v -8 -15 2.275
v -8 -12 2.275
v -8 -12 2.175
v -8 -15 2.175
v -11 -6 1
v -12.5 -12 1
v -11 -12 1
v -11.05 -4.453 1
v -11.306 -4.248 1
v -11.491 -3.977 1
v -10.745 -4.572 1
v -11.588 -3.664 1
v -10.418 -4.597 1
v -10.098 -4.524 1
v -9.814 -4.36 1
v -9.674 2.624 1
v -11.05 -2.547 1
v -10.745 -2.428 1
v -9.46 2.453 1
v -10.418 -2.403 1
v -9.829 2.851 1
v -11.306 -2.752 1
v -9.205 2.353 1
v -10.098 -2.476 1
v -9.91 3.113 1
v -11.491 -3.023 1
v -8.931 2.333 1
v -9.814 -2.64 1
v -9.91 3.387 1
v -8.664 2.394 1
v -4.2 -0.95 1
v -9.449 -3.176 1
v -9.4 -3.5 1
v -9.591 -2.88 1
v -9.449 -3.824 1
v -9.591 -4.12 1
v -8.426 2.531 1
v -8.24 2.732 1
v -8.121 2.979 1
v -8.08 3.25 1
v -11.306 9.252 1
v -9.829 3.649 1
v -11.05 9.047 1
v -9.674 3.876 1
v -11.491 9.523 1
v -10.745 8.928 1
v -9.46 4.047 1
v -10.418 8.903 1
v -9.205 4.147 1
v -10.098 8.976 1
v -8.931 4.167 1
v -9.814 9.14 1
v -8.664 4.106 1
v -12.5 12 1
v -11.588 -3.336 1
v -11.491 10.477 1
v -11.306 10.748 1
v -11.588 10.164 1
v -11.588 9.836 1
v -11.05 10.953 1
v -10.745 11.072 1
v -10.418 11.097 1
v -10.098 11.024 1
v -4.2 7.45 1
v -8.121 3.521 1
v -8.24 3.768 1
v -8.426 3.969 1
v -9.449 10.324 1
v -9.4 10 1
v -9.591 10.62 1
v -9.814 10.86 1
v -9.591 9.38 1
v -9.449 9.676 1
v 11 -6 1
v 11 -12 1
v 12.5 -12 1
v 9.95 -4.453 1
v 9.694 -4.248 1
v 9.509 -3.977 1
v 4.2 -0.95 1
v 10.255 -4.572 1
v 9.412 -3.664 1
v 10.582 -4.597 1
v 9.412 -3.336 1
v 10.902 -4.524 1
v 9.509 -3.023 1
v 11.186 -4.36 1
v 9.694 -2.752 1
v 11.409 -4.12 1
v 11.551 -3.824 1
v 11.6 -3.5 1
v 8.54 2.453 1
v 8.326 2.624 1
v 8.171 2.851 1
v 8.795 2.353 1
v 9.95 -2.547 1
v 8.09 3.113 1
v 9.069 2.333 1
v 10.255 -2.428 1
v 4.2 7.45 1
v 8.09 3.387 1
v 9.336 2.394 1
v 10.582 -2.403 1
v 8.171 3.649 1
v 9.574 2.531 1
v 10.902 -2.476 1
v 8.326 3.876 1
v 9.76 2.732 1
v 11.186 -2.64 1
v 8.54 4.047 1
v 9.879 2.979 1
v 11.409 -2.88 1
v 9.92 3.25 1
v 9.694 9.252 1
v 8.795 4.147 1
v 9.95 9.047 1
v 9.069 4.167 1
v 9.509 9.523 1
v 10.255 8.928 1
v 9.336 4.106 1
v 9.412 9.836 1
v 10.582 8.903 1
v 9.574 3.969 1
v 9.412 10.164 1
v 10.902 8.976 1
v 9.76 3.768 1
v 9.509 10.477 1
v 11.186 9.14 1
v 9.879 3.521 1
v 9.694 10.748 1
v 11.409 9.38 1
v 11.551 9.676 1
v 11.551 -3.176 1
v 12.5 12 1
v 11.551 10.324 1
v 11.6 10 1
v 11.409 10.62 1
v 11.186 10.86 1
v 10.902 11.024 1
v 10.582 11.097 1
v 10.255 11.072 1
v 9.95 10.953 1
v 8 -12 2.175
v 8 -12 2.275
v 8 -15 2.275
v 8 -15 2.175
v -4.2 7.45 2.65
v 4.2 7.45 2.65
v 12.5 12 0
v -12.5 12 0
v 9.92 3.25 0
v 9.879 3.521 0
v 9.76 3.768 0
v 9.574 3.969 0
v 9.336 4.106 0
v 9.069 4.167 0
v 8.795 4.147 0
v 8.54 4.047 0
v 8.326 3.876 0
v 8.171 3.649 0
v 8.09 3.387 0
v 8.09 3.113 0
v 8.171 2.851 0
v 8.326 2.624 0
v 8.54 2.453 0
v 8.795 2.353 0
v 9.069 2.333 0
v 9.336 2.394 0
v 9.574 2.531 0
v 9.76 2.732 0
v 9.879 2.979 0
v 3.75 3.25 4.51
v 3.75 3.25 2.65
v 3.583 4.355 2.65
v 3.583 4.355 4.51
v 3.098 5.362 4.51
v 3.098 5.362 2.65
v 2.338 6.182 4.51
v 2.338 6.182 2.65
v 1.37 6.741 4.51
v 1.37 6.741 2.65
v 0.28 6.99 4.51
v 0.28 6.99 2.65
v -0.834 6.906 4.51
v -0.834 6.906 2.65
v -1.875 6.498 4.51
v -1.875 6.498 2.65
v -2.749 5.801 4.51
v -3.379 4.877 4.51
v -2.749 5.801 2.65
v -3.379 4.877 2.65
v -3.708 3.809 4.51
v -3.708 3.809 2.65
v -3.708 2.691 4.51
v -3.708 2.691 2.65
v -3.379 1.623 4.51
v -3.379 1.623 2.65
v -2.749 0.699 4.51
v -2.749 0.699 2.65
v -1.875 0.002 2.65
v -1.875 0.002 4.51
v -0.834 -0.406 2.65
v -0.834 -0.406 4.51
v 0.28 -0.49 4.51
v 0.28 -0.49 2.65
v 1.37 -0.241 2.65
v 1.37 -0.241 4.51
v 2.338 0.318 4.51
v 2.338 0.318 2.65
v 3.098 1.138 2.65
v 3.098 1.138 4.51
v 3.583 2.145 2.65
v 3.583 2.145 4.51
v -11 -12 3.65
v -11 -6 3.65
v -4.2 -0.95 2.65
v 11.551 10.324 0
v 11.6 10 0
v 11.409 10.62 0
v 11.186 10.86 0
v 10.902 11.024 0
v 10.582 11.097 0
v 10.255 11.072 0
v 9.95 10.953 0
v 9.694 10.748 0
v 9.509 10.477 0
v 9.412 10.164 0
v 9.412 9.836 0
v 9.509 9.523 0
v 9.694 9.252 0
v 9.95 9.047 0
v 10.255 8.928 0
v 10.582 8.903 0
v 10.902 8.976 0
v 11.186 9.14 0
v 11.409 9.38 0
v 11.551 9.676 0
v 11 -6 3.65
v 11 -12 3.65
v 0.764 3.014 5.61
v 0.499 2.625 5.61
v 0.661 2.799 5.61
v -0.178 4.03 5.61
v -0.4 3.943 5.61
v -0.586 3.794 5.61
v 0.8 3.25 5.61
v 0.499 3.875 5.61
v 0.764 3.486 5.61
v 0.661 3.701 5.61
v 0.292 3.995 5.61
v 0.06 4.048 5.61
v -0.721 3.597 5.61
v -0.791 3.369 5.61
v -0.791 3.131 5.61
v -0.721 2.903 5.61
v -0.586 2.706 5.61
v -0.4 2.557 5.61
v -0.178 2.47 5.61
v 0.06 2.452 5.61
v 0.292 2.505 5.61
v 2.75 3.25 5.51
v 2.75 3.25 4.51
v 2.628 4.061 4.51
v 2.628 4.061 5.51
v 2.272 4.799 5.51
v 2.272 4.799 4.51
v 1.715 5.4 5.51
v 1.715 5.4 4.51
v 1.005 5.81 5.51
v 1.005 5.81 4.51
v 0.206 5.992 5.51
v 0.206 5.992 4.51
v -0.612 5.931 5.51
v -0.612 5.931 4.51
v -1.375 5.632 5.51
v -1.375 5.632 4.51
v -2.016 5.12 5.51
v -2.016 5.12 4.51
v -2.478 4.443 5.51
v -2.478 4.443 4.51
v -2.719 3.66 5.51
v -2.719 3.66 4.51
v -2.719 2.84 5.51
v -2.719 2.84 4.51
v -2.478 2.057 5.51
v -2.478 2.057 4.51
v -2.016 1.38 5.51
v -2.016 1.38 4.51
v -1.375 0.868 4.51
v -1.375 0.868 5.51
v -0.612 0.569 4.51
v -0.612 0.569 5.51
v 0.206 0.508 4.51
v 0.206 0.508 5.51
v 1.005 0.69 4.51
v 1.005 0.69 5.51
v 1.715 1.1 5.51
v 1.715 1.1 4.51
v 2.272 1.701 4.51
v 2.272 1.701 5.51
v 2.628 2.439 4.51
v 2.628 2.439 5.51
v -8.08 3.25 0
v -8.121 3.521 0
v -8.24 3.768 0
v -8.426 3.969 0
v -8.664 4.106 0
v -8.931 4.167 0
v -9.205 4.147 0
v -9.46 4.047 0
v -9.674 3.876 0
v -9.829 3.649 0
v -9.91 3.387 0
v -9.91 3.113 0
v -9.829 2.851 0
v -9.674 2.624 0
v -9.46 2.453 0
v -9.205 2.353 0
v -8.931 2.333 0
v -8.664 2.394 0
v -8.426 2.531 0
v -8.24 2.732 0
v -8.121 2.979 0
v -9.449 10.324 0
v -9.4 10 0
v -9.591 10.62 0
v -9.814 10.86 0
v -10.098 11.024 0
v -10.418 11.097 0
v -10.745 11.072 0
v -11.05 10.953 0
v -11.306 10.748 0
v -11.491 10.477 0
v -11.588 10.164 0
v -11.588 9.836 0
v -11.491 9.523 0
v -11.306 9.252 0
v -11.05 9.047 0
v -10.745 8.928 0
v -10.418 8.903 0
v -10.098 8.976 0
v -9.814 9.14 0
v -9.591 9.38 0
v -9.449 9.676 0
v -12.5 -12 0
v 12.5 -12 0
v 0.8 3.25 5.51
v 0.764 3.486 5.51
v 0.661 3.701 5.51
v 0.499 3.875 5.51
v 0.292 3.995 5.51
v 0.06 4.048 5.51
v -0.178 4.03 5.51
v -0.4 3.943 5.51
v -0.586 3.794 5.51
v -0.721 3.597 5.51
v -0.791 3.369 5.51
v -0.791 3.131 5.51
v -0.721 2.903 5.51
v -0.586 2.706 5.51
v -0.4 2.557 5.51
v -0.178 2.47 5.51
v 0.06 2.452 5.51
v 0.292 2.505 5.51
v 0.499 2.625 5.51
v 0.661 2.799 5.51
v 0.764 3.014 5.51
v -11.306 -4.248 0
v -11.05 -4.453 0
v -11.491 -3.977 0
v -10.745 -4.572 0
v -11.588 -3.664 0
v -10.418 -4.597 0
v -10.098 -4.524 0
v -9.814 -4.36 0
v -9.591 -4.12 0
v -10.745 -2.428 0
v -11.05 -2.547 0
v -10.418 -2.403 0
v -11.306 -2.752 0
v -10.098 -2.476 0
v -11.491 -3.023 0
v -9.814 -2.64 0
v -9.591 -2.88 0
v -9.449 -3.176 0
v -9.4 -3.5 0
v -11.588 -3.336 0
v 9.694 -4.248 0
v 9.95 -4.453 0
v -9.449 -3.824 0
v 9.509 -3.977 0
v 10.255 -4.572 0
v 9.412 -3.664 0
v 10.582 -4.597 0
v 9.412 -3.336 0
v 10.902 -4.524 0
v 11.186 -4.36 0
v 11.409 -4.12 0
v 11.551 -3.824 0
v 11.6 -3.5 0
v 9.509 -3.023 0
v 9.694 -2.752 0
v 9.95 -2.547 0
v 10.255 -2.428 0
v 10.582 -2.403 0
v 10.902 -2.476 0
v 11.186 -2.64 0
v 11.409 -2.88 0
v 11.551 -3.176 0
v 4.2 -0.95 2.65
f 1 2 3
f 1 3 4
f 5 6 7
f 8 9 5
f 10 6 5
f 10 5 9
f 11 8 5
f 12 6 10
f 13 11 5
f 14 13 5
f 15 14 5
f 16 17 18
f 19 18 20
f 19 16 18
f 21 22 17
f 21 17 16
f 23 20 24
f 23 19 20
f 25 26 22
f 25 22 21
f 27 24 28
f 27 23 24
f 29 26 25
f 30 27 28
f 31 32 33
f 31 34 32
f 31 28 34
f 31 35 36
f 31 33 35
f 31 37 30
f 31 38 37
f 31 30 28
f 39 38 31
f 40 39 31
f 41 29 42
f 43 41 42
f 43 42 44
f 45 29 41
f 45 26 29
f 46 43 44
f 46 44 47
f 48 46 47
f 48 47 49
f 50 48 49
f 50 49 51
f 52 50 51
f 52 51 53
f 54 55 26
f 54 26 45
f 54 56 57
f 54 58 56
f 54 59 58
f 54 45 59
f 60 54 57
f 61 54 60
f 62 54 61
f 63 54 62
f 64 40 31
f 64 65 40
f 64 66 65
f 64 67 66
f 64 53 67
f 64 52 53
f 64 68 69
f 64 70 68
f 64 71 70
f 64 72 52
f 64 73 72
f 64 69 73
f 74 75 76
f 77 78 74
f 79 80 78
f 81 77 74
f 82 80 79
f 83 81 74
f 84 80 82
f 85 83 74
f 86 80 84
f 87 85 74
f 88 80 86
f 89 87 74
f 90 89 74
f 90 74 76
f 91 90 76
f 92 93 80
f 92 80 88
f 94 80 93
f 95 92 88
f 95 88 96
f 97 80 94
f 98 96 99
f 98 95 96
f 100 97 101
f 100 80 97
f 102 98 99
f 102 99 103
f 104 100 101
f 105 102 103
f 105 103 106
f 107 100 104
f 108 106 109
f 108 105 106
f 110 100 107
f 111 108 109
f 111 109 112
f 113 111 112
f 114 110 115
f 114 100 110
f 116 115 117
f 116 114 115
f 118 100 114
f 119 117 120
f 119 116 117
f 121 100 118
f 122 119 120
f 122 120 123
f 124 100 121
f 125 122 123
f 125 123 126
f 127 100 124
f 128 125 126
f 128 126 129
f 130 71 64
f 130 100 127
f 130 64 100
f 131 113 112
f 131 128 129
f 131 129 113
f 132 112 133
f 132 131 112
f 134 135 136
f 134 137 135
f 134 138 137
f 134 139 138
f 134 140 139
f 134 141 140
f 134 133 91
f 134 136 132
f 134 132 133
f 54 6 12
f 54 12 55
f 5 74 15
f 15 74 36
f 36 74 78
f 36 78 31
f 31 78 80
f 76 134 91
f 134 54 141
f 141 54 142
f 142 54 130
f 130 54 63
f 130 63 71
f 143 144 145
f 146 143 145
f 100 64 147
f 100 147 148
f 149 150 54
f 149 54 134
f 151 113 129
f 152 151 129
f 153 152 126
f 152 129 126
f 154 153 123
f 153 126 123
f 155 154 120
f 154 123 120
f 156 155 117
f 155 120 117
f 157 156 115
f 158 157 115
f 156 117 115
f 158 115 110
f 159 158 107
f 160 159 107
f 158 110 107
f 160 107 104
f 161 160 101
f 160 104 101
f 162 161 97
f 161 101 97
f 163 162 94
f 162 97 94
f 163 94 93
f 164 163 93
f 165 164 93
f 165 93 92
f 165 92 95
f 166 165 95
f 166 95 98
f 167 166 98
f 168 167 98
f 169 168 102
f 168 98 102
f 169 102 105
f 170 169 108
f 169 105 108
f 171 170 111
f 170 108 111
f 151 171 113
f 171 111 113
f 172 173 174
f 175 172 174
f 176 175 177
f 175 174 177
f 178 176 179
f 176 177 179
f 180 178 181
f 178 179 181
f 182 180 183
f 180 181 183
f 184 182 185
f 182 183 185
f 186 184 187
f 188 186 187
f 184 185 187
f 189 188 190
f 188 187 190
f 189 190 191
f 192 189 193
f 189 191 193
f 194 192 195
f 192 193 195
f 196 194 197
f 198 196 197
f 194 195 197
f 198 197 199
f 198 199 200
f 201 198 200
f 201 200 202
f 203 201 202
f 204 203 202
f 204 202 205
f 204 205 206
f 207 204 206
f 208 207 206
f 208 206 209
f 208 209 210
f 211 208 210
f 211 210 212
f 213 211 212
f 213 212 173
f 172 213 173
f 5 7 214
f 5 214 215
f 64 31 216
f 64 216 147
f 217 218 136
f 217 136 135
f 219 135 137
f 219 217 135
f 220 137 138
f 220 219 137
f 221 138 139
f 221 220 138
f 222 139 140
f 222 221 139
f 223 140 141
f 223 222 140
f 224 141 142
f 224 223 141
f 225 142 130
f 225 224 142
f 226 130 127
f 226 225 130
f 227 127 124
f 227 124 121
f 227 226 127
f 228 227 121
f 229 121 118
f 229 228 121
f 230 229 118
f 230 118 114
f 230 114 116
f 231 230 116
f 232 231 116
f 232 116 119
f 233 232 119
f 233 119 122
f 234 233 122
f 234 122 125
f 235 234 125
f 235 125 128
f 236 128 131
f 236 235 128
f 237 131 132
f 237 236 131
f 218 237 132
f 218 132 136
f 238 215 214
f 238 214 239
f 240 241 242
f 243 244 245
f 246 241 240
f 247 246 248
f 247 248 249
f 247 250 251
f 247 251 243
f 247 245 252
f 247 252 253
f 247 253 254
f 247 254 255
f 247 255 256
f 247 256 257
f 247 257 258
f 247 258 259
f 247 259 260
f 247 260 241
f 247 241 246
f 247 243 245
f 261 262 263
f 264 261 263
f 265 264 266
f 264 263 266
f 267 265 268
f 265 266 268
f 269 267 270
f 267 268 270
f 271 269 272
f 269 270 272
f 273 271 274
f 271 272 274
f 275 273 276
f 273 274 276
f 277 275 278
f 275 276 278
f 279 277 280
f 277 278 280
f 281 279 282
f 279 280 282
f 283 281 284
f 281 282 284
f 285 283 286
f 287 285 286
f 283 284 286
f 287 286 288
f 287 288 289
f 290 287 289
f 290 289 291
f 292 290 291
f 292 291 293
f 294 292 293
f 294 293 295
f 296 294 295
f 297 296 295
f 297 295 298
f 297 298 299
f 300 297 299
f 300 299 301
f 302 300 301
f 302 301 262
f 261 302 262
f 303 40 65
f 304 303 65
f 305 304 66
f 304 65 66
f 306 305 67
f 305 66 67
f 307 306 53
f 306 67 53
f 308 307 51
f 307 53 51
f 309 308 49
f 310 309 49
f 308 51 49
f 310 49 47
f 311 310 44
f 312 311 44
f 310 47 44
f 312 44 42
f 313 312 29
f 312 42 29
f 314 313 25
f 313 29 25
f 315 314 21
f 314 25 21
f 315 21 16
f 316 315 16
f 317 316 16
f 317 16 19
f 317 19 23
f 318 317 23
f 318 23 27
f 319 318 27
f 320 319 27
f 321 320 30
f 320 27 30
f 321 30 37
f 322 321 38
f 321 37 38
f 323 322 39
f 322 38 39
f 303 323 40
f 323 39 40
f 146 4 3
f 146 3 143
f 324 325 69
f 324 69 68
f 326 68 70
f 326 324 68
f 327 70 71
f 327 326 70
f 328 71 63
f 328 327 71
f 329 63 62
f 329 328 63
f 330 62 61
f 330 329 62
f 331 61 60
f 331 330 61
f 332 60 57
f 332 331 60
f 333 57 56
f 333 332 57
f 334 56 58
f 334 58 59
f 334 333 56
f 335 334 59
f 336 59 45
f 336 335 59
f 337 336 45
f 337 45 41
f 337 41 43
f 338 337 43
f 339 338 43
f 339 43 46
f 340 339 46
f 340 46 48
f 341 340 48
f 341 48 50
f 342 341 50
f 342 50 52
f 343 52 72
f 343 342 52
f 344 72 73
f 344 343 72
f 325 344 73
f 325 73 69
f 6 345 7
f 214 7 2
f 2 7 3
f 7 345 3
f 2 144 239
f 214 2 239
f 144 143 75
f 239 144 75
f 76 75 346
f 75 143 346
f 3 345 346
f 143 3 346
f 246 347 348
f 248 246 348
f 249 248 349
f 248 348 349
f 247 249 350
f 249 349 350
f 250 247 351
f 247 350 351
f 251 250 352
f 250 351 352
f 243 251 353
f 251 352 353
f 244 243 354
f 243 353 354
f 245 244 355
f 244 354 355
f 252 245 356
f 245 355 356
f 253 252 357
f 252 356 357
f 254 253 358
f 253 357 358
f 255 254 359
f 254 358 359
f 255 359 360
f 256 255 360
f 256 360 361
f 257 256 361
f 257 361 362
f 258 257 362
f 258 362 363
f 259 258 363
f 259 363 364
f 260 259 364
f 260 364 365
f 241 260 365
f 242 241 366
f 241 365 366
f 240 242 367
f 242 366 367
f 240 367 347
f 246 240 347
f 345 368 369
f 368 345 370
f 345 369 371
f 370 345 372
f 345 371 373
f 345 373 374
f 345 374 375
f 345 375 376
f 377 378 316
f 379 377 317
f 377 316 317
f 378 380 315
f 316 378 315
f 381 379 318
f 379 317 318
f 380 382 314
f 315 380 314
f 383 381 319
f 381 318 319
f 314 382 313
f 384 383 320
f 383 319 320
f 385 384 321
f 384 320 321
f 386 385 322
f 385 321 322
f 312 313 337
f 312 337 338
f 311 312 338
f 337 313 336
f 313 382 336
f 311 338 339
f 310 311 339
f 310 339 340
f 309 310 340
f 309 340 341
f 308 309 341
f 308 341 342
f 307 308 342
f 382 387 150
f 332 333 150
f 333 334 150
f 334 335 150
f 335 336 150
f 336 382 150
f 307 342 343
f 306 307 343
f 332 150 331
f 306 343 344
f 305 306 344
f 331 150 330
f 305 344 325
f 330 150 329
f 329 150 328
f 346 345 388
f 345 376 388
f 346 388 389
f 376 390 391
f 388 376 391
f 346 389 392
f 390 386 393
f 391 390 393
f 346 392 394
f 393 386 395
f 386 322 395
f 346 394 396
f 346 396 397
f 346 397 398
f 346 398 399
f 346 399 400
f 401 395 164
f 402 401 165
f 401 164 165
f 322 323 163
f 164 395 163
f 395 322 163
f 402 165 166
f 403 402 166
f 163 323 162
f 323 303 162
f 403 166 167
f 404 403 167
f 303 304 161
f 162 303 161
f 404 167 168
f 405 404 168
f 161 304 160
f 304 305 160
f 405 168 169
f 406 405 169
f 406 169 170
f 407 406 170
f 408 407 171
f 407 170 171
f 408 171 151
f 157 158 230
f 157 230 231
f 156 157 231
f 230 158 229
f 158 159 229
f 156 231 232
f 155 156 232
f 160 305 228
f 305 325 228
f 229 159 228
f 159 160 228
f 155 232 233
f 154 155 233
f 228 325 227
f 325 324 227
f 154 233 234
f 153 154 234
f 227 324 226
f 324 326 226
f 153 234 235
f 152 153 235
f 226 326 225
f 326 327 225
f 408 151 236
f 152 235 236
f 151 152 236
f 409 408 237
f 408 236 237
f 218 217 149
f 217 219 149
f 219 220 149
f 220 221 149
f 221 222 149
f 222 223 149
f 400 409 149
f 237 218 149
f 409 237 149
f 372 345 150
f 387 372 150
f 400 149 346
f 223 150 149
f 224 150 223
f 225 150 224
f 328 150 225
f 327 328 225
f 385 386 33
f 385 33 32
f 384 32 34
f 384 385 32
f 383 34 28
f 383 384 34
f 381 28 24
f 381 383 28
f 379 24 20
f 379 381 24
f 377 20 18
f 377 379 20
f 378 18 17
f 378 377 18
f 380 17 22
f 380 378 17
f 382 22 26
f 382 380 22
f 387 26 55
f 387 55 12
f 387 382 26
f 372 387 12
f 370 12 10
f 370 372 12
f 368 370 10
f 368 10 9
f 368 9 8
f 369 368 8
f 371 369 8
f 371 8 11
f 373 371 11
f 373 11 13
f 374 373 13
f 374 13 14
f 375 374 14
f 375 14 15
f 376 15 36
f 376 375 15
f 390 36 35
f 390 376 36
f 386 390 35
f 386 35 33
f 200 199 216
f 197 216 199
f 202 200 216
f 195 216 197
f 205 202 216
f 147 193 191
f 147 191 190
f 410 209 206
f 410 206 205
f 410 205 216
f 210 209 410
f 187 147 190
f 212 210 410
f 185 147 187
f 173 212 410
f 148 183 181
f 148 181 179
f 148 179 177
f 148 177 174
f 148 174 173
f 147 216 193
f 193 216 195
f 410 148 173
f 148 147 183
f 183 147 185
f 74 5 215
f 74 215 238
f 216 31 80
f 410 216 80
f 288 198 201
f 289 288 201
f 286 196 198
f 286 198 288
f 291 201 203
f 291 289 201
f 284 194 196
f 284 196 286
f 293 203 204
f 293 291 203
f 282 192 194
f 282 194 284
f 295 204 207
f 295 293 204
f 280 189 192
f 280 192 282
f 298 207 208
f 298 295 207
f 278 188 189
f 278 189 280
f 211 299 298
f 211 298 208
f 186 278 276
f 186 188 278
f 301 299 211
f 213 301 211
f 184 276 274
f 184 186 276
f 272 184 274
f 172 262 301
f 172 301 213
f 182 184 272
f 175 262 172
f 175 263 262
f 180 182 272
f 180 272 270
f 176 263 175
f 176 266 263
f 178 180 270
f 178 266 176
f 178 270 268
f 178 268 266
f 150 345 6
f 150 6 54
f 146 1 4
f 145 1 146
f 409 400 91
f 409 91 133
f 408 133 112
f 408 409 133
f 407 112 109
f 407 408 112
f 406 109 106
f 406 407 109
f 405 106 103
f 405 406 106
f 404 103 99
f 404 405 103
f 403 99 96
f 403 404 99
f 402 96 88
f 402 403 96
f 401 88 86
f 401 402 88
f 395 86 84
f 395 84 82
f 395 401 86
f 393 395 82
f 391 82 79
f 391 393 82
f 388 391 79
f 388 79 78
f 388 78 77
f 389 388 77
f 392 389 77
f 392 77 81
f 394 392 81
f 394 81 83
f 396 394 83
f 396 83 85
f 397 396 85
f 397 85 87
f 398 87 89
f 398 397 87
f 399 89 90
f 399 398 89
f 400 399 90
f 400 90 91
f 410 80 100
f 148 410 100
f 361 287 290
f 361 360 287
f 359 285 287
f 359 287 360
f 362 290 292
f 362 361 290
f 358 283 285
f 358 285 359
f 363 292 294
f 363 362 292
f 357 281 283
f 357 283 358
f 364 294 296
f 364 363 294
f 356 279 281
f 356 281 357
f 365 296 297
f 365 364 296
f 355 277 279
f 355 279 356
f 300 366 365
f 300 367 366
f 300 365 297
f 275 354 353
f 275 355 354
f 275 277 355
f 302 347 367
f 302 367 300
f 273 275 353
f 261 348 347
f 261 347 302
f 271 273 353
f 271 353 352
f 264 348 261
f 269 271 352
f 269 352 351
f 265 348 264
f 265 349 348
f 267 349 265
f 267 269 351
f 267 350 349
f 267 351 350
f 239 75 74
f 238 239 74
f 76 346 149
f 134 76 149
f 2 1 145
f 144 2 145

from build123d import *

# Parameters (mm, degrees)
F0_W      = 25
F0_H      = 24
F0_R      = 1.1
F1_DEPTH  = 1
F2_R      = 0.92
F3_DEPTH  = 1
F2_W      = 8.4
F2_H      = 8.4
F2_R_2    = 3.75
F2_R_3    = 2.75
F4_DEPTH  = 1.65
F5_DEPTH  = 3.51
F6_DEPTH  = 4.51
F7_R      = 0.8
F8_DEPTH  = 0.1
F9_W      = 22
F9_H      = 6
F10_DEPTH = 2.65
F12_W     = 16
F12_H     = 3
F13_DEPTH = 0.1


with BuildPart() as f1:
    # F0 (on Top) → F1 (new body)
    with BuildSketch(Plane.XY):
        Rectangle(F0_W, F0_H)
        with Locations((-10.5, -3.5)):
            Circle(F0_R, mode=Mode.SUBTRACT)
        with Locations((10.5, -3.5)):
            Circle(F0_R, mode=Mode.SUBTRACT)
        with Locations((-10.5, 10)):
            Circle(F0_R, mode=Mode.SUBTRACT)
        with Locations((10.5, 10)):
            Circle(F0_R, mode=Mode.SUBTRACT)
    extrude(amount=F1_DEPTH)

    # F2 (on face) → F3 (cut, through all)
    with BuildSketch(Plane.XY.offset(1)):
        with Locations((-9, 3.25)):
            Circle(F2_R)
        with Locations((9, 3.25)):
            Circle(F2_R)
    extrude(amount=-F3_DEPTH, mode=Mode.SUBTRACT)

    # F2 (on face) → F4 (join)
    with BuildSketch(Plane.XY.offset(1)):
        with Locations((0, 3.25)):
            Rectangle(F2_W, F2_H)
        with Locations((0, 3.25)):
            Circle(F2_R_2, mode=Mode.SUBTRACT)
        with Locations((0, 3.25)):
            Circle(F2_R_2)
        with Locations((0, 3.25)):
            Circle(F2_R_3, mode=Mode.SUBTRACT)
        with Locations((0, 3.25)):
            Circle(F2_R_3)
    extrude(amount=F4_DEPTH)

    # F2 (on face) → F5 (join)
    with BuildSketch(Plane.XY.offset(1)):
        with Locations((0, 3.25)):
            Circle(F2_R_2)
        with Locations((0, 3.25)):
            Circle(F2_R_3, mode=Mode.SUBTRACT)
        with Locations((0, 3.25)):
            Circle(F2_R_3)
    extrude(amount=F5_DEPTH)

    # F2 (on face) → F6 (join)
    with BuildSketch(Plane.XY.offset(1)):
        with Locations((0, 3.25)):
            Circle(F2_R_3)
    extrude(amount=F6_DEPTH)

    # F7 (on face) → F8 (join)
    with BuildSketch(Plane.XY.offset(5.51)):
        with Locations((0, 3.25)):
            Circle(F7_R)
    extrude(amount=F8_DEPTH)

    # F9 (on face) → F10 (join)
    with BuildSketch(Plane.XY.offset(1)):
        with Locations((0, -9)):
            Rectangle(F9_W, F9_H)
    extrude(amount=F10_DEPTH)

    # F12 (on offset) → F13 (join)
    with BuildSketch(Plane(origin=(0, 0, 2.275), x_dir=(1, 0, 0), z_dir=(0, 0, -1))):
        with Locations((0, 13.5)):
            Rectangle(F12_W, F12_H)
    extrude(amount=F13_DEPTH)


solid = f1.part
